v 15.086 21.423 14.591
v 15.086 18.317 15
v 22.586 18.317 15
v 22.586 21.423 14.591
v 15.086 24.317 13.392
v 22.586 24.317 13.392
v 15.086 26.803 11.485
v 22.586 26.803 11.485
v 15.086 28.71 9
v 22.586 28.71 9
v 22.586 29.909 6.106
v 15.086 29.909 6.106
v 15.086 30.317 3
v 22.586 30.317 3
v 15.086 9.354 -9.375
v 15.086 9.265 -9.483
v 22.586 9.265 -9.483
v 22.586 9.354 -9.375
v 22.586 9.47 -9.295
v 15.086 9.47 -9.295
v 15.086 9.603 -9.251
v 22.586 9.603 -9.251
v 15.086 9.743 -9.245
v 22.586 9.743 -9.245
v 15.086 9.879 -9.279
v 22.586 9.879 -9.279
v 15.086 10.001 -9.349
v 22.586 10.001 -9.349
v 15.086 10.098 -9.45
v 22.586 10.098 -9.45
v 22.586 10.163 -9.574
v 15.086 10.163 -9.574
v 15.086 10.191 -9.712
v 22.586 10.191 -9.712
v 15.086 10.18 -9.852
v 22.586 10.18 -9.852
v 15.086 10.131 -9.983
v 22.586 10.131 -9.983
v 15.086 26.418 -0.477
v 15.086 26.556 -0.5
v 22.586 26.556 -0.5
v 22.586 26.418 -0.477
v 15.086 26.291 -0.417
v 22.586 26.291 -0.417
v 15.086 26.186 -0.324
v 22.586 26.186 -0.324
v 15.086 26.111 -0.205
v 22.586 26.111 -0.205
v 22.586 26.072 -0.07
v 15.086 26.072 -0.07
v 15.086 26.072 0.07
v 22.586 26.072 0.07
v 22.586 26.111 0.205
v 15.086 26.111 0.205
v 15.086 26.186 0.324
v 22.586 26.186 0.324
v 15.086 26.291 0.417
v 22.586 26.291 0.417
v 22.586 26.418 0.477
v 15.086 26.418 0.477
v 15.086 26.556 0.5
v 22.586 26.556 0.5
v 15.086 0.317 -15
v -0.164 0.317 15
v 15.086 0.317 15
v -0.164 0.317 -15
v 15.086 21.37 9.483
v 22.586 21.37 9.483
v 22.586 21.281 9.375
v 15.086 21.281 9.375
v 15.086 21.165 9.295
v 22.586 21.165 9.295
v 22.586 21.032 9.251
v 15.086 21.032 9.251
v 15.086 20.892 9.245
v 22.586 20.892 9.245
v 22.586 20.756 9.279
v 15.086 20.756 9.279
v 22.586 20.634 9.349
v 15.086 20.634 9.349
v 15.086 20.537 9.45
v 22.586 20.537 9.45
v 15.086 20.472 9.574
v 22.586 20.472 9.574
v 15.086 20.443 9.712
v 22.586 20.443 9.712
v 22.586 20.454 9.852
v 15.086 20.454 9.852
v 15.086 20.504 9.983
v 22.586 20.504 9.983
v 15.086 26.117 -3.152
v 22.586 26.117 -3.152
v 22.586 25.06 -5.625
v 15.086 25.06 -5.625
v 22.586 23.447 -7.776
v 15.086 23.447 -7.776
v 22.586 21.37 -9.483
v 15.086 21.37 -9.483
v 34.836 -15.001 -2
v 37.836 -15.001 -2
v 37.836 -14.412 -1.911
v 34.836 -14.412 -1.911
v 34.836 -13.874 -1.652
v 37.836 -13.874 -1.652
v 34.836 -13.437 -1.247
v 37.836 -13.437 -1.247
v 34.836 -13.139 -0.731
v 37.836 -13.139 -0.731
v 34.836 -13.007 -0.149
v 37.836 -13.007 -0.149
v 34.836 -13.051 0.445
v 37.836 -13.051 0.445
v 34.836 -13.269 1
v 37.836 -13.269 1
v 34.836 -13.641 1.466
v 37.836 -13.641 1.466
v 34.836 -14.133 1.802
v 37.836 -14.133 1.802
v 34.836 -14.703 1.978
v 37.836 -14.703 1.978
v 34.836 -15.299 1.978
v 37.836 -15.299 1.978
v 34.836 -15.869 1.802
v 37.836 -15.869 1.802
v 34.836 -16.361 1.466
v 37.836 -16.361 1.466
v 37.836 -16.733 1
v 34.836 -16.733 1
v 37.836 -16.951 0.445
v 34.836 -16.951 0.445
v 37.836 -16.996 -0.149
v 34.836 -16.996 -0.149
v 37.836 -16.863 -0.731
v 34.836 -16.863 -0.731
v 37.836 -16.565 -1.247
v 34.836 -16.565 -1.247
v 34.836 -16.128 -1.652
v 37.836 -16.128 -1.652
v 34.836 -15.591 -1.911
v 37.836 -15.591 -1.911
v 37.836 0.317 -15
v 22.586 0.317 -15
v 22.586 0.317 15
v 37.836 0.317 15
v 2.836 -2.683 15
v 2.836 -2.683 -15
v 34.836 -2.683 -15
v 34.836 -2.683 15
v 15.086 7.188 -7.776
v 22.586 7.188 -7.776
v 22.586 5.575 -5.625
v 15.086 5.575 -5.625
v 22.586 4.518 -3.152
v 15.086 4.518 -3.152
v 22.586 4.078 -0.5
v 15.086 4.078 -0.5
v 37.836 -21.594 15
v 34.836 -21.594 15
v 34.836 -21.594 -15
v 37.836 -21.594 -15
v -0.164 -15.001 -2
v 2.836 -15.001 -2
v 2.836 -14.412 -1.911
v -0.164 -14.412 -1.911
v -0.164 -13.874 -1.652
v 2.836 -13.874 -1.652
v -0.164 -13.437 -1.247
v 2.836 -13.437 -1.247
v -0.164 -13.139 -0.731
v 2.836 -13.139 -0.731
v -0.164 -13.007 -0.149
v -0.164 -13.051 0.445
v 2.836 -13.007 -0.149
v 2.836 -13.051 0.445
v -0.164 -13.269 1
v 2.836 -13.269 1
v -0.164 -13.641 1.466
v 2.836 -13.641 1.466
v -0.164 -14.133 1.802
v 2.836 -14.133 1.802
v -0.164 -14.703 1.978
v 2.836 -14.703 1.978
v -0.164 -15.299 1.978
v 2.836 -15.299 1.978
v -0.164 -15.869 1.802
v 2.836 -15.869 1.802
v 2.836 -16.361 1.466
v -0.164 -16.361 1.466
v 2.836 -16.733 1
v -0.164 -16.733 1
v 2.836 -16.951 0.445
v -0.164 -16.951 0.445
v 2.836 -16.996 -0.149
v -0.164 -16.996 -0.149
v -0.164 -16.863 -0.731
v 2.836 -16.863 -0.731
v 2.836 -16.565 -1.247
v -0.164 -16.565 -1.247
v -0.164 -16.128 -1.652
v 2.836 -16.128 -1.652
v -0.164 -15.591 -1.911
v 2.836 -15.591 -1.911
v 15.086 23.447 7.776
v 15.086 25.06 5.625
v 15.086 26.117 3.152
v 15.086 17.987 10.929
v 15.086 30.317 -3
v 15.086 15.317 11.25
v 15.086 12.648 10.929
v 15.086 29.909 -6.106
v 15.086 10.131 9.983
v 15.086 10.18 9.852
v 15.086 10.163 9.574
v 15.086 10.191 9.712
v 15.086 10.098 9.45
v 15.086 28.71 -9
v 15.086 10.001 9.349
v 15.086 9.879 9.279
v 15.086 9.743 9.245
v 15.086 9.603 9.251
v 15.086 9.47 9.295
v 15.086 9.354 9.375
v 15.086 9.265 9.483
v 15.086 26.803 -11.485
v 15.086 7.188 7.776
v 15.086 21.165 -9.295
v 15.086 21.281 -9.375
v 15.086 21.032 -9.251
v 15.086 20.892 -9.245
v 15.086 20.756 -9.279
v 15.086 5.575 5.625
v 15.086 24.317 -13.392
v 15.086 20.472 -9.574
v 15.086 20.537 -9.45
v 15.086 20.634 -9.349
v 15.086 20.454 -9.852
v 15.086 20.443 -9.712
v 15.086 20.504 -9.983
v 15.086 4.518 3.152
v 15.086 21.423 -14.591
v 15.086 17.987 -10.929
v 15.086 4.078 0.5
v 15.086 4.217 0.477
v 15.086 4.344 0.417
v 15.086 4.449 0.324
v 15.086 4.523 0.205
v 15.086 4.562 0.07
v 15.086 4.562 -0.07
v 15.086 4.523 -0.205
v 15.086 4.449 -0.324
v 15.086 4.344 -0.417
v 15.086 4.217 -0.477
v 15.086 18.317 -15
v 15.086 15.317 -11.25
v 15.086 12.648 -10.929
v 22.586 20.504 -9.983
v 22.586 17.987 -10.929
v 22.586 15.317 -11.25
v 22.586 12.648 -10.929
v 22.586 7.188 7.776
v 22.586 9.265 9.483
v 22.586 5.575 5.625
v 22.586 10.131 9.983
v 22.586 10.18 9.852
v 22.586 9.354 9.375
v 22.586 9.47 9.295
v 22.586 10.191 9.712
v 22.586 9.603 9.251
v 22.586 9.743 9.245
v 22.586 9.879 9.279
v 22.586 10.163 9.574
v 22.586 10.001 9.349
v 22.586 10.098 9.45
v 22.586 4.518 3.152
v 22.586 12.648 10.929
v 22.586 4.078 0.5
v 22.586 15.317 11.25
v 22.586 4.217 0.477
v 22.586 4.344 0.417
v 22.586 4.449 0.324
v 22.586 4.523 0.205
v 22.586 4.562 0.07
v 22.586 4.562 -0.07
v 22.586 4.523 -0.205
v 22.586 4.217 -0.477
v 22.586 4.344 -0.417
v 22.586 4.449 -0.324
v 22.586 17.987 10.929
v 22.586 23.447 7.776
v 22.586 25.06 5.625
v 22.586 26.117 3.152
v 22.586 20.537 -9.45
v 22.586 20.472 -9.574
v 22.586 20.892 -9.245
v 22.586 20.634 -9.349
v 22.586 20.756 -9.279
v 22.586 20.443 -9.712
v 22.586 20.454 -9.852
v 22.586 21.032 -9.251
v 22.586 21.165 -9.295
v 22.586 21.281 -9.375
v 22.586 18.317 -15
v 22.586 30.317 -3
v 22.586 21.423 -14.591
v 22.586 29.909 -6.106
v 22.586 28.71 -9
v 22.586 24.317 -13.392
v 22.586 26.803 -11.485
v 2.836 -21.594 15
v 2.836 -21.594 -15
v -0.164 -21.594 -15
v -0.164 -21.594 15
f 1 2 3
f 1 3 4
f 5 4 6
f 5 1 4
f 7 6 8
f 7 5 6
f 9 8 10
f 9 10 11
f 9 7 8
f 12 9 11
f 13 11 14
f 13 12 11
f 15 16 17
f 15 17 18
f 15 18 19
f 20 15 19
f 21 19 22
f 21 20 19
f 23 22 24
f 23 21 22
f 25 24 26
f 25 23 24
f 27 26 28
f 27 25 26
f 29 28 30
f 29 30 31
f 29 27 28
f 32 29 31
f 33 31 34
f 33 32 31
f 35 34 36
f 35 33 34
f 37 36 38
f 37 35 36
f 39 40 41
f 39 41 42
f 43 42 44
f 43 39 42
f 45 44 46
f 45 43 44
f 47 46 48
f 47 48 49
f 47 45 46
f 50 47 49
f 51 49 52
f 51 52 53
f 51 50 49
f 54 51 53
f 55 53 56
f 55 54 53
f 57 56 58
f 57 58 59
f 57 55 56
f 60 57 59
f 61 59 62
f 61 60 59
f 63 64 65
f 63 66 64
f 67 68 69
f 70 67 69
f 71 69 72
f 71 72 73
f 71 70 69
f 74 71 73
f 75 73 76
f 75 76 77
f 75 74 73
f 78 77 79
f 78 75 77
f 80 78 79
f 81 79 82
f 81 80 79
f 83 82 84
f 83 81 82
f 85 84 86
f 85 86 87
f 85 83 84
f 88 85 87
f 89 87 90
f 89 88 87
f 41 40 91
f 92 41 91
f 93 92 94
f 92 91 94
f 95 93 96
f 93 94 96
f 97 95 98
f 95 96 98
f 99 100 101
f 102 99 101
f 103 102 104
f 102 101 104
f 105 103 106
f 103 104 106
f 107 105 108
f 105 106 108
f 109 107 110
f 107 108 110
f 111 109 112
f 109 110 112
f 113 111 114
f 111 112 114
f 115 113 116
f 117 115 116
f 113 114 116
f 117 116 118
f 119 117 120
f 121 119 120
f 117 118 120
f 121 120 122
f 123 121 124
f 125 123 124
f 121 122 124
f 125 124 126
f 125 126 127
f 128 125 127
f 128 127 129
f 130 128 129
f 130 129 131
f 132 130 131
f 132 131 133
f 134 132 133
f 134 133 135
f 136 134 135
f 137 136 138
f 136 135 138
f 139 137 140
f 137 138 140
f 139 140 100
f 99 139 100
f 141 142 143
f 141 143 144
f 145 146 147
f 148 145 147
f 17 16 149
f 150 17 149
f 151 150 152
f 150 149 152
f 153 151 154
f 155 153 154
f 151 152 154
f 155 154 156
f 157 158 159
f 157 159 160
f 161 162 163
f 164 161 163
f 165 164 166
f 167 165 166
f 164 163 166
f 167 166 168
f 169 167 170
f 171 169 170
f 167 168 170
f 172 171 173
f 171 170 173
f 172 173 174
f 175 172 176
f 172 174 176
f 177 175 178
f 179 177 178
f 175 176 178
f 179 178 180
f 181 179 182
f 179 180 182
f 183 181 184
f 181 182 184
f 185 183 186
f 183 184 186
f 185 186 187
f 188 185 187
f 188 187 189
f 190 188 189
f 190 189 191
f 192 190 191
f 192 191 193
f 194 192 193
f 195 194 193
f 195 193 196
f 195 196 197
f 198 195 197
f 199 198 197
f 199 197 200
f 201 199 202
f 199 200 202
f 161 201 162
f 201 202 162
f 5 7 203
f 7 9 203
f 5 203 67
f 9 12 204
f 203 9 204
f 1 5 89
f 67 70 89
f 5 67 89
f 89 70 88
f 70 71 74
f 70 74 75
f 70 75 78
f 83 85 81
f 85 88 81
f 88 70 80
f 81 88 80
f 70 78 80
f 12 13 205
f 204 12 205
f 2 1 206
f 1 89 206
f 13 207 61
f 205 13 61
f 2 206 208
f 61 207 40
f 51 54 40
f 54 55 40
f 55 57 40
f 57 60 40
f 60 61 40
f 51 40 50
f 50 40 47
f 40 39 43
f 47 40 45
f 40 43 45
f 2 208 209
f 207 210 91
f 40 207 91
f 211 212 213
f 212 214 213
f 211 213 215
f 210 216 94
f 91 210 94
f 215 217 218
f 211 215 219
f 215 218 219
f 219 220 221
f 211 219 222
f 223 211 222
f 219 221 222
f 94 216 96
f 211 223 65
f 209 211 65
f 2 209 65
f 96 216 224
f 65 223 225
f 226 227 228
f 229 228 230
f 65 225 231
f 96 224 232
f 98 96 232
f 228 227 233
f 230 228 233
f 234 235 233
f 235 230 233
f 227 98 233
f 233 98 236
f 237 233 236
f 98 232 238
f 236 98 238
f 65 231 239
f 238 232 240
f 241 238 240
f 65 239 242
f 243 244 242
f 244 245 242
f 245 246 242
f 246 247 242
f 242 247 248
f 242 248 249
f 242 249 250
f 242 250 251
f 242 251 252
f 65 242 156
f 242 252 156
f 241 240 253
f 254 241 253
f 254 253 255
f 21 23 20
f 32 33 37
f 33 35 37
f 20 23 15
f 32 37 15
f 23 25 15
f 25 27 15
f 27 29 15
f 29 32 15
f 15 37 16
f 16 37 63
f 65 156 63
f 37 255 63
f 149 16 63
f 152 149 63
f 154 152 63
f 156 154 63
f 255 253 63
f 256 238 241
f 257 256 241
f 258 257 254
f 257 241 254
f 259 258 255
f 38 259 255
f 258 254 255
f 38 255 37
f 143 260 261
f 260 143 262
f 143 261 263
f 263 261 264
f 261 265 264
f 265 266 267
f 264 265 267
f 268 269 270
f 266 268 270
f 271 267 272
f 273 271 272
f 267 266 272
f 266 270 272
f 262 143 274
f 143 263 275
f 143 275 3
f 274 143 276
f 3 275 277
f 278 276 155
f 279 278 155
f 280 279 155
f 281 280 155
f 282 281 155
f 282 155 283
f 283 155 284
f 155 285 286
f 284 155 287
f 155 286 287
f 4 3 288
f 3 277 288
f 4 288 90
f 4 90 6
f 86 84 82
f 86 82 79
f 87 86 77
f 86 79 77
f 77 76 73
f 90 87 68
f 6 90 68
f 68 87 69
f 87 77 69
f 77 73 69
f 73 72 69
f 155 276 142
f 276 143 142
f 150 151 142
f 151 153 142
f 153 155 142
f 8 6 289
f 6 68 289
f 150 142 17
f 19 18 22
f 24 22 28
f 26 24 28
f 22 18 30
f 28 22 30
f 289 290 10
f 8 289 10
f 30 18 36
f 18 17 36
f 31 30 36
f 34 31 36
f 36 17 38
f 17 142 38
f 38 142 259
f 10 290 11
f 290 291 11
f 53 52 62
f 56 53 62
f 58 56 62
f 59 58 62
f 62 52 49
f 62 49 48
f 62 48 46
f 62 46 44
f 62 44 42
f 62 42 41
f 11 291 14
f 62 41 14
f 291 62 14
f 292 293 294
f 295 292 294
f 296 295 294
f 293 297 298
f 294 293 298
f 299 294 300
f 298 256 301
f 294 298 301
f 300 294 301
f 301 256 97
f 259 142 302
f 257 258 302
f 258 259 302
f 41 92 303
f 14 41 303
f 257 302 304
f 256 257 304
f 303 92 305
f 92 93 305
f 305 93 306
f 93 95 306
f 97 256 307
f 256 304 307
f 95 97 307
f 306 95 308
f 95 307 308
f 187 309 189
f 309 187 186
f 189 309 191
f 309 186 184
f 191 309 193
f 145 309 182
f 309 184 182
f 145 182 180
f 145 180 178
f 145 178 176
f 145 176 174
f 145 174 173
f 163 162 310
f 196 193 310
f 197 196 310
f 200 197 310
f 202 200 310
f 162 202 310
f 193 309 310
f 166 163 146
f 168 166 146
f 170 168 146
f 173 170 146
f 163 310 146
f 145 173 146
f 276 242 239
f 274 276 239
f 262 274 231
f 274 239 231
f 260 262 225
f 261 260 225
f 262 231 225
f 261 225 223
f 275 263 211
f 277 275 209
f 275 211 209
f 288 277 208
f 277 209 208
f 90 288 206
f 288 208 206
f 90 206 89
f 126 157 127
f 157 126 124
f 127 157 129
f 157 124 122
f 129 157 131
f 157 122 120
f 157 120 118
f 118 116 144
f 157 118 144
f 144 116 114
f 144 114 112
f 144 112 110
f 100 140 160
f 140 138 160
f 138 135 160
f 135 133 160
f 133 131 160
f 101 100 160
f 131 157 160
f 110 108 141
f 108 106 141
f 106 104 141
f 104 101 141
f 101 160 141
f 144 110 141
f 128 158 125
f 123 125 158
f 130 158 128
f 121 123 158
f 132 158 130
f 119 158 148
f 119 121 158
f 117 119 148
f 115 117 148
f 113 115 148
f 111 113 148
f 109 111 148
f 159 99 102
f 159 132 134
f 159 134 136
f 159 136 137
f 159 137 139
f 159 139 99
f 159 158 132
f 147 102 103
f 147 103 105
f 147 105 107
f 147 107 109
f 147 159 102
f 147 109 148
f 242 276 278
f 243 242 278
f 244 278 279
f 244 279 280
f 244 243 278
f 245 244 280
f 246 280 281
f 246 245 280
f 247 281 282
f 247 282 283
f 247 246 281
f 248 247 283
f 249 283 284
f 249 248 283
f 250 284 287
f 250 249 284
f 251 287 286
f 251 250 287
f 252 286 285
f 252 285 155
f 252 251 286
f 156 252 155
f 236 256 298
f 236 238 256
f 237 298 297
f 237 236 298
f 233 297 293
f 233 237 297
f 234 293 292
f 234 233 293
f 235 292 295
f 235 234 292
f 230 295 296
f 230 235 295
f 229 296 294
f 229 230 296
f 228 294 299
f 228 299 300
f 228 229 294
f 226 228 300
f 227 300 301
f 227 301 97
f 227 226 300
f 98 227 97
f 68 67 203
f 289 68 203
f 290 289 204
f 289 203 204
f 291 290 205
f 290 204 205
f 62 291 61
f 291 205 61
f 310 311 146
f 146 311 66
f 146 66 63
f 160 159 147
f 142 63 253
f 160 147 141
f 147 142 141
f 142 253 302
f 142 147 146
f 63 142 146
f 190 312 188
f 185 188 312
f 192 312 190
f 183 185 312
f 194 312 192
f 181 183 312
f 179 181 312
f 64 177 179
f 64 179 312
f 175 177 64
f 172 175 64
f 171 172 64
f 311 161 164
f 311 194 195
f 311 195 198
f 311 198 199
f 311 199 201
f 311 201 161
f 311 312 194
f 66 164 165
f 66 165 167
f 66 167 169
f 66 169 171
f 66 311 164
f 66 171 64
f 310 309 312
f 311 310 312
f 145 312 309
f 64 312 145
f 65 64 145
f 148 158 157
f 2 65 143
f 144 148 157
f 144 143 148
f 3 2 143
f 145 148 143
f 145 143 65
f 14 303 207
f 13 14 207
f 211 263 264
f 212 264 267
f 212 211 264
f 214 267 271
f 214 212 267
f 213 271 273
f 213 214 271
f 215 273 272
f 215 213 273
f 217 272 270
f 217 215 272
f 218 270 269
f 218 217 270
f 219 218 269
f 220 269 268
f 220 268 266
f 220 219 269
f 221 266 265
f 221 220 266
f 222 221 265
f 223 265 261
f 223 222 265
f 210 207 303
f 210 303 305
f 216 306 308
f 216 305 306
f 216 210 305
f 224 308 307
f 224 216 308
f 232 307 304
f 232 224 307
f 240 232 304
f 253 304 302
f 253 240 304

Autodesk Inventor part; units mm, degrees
ref_plane "YZ Plane" through (0, 0, 0) normal (1, 0, 0) x (0, 1, 0)
ref_plane "XZ Plane" through (0, 0, 0) normal (0, 1, 0) x (-1, 0, 0)
ref_plane "XY Plane" through (0, 0, 0) normal (0, 0, 1) x (1, 0, 0)
sketch "Sketch2" plane through (0, 0, 0) normal (0, 0, 1) x (1, 0, 0)
  line L0 (31.3357, -4.795) -> (6.3357, -4.795) projected
  line L1 (6.3357, -4.795) -> (6.3357, -1.5952) projected
  line L2 (31.3357, -1.5952) -> (6.3357, -1.5952) projected
  line L3 (31.3357, -4.795) -> (31.3357, -1.5952) projected
  line L4 (6.3357, -1.5952) -> (6.3357, -21.5944) projected
  line L5 (6.3357, -21.5944) -> (3.1357, -21.5944) projected
  line L6 (3.1357, -1.5952) -> (3.1357, -21.5944) projected
  line L7 (6.3357, -1.5952) -> (3.1357, -1.5952) projected
  line L8 (31.3357, -21.5944) -> (31.3357, -1.5952) projected
  line L9 (31.3357, -1.5952) -> (34.5357, -1.5952) projected
  line L10 (34.5357, -21.5944) -> (34.5357, -1.5952) projected
  line L11 (31.3357, -21.5944) -> (34.5357, -21.5944) projected
  line L12 (6.3357, -23.8087) -> (3.1357, -23.8087) projected
  line L13 (34.8357, -21.5944) -> (34.8357, -2.6826)
  line L14 (34.8357, -21.5944) -> (37.8357, -21.5944)
  line L15 (37.8357, -21.5944) -> (37.8357, 0.3174)
  line L16 (18.8357, -1.5952) -> (18.8357, -12.9026) construction
  line L17 (2.8357, -21.5944) -> (2.8357, -2.6826)
  line L18 (2.8357, -21.5944) -> (-0.1643, -21.5944)
  line L19 (-0.1643, -21.5944) -> (-0.1643, 0.3174)
  line L20 (2.8357, -2.6826) -> (34.8357, -2.6826)
  line L21 (-0.1643, 0.3174) -> (37.8357, 0.3174)
  line L22 (22.5857, 0.3174) -> (22.5857, 30.3174)
  line L23 (22.5857, 30.3174) -> (15.0857, 30.3174)
  line L24 (15.0857, 30.3174) -> (15.0857, 0.3174)
  line L25 (6.3357, -2.9826) -> (31.3357, -2.9826) projected
  point P0 (0, 0)
  dimension "d1" = 0.3
  dimension "d2" = 3
  dimension "d5" = 32
  dimension "d9" = 30
  dimension "d10" = 7.5
  dimension "d11" = 3.75
  dimension "d18" = 0.3
  dimension "d19" = 3
extrude "Extrusion1" add sketch "Sketch2" along normal mid plane 30 contours L20 L1 L2 L3 | L3 L9 L10 L20 | L20 L6 L7 L1 | L2 L7 L6 L20 L17 L18 L19 L21 L15 L14 L13 L10 L9 | L21 L24 L23 L22
sketch "Sketch3" plane through (37.8357, -21.5944, 15) normal (1, 0, 0) x (0, 0, -1)
  circle A0 centre (13.5169, 6.5933) radius 2 projected
  line L0 (30, 21.9118) -> (30, 0) projected
  line L1 (0, 0) -> (0, 21.9118) projected
  line L2 (30, 0) -> (0, 0) projected
  line L3 (0, 21.9118) -> (30, 21.9118) projected
  line L4 (30, 0) -> (0, 0) projected
  line L5 (15, 0) -> (15, 21.9118) construction
  circle A1 centre (15, 6.5933) radius 2
  point P0 (15, 21.5944)
  dimension "d14" = 4
  dimension "d15" = 6.5933
extrude "Extrusion2" cut sketch "Sketch3" against normal blind 60 contours A0 A1 | A0 A1 picked at (14.6591, 6.7506) picked at (16.4859, 6.7542)
sketch "Sketch4" plane through (15.0857, 0.3174, 15) normal (-1, 0, 0) x (0, 0, 1)
  line L0 (-30, 0) -> (0, 0) projected
  line L1 (0, 30) -> (0, 0) projected
  line L2 (-30, 30) -> (0, 30) projected
  line L3 (-30, 0) -> (-30, 30) projected
  line L4 (-30, 0) -> (0, 0) projected
  line L5 (-15, 0) -> (-15, 30) construction
  line L6 (-30, 30) -> (0, 30) projected
  line L7 (0, 0) -> (0, 30) projected
  line L8 (0, 15) -> (-30, 15) construction
  circle A0 centre (-15, 15) radius 11.25
  arc A1 (-14.5001, 3.7611) -> (-15.4999, 3.7611) centre (-15, 3.75) ccw
  arc A2 (-5.0169, 9.8135) -> (-5.5168, 8.9476) centre (-5.2572, 9.375) ccw
  arc A3 (-5.5168, 21.0524) -> (-5.0169, 20.1865) centre (-5.2572, 20.625) ccw
  arc A4 (-15.4999, 26.2389) -> (-14.5001, 26.2389) centre (-15, 26.25) ccw
  arc A5 (-24.9831, 20.1865) -> (-24.4832, 21.0524) centre (-24.7428, 20.625) ccw
  arc A6 (-24.4832, 8.9476) -> (-24.9831, 9.8135) centre (-24.7428, 9.375) ccw
  point P0 (-15, -0.3174)
  point P1 (-24.9831, 9.8135)
  point P2 (-24.4832, 8.9476)
  point P3 (-5.5168, 8.9476)
  point P4 (-5.0169, 9.8135)
  point P5 (-5.0169, 20.1865)
  point P6 (-5.5168, 21.0524)
  point P7 (-14.5001, 26.2389)
  point P8 (-15.4999, 26.2389)
  point P9 (-24.4832, 21.0524)
  point P10 (-24.9831, 20.1865)
  dimension "d20" = 22.5
  dimension "d21" = 1
  dimension "d24" = 360
extrude "Extrusion3" cut sketch "Sketch4" against normal blind 10 contours A0 A2 A1 A6 A5 A4 A3
fillet "Fillet1" radius 12 2 edges at (18.8357, 30.3174, 15) (18.8357, 30.3174, -15)
properties part number "Eje_Carril"
